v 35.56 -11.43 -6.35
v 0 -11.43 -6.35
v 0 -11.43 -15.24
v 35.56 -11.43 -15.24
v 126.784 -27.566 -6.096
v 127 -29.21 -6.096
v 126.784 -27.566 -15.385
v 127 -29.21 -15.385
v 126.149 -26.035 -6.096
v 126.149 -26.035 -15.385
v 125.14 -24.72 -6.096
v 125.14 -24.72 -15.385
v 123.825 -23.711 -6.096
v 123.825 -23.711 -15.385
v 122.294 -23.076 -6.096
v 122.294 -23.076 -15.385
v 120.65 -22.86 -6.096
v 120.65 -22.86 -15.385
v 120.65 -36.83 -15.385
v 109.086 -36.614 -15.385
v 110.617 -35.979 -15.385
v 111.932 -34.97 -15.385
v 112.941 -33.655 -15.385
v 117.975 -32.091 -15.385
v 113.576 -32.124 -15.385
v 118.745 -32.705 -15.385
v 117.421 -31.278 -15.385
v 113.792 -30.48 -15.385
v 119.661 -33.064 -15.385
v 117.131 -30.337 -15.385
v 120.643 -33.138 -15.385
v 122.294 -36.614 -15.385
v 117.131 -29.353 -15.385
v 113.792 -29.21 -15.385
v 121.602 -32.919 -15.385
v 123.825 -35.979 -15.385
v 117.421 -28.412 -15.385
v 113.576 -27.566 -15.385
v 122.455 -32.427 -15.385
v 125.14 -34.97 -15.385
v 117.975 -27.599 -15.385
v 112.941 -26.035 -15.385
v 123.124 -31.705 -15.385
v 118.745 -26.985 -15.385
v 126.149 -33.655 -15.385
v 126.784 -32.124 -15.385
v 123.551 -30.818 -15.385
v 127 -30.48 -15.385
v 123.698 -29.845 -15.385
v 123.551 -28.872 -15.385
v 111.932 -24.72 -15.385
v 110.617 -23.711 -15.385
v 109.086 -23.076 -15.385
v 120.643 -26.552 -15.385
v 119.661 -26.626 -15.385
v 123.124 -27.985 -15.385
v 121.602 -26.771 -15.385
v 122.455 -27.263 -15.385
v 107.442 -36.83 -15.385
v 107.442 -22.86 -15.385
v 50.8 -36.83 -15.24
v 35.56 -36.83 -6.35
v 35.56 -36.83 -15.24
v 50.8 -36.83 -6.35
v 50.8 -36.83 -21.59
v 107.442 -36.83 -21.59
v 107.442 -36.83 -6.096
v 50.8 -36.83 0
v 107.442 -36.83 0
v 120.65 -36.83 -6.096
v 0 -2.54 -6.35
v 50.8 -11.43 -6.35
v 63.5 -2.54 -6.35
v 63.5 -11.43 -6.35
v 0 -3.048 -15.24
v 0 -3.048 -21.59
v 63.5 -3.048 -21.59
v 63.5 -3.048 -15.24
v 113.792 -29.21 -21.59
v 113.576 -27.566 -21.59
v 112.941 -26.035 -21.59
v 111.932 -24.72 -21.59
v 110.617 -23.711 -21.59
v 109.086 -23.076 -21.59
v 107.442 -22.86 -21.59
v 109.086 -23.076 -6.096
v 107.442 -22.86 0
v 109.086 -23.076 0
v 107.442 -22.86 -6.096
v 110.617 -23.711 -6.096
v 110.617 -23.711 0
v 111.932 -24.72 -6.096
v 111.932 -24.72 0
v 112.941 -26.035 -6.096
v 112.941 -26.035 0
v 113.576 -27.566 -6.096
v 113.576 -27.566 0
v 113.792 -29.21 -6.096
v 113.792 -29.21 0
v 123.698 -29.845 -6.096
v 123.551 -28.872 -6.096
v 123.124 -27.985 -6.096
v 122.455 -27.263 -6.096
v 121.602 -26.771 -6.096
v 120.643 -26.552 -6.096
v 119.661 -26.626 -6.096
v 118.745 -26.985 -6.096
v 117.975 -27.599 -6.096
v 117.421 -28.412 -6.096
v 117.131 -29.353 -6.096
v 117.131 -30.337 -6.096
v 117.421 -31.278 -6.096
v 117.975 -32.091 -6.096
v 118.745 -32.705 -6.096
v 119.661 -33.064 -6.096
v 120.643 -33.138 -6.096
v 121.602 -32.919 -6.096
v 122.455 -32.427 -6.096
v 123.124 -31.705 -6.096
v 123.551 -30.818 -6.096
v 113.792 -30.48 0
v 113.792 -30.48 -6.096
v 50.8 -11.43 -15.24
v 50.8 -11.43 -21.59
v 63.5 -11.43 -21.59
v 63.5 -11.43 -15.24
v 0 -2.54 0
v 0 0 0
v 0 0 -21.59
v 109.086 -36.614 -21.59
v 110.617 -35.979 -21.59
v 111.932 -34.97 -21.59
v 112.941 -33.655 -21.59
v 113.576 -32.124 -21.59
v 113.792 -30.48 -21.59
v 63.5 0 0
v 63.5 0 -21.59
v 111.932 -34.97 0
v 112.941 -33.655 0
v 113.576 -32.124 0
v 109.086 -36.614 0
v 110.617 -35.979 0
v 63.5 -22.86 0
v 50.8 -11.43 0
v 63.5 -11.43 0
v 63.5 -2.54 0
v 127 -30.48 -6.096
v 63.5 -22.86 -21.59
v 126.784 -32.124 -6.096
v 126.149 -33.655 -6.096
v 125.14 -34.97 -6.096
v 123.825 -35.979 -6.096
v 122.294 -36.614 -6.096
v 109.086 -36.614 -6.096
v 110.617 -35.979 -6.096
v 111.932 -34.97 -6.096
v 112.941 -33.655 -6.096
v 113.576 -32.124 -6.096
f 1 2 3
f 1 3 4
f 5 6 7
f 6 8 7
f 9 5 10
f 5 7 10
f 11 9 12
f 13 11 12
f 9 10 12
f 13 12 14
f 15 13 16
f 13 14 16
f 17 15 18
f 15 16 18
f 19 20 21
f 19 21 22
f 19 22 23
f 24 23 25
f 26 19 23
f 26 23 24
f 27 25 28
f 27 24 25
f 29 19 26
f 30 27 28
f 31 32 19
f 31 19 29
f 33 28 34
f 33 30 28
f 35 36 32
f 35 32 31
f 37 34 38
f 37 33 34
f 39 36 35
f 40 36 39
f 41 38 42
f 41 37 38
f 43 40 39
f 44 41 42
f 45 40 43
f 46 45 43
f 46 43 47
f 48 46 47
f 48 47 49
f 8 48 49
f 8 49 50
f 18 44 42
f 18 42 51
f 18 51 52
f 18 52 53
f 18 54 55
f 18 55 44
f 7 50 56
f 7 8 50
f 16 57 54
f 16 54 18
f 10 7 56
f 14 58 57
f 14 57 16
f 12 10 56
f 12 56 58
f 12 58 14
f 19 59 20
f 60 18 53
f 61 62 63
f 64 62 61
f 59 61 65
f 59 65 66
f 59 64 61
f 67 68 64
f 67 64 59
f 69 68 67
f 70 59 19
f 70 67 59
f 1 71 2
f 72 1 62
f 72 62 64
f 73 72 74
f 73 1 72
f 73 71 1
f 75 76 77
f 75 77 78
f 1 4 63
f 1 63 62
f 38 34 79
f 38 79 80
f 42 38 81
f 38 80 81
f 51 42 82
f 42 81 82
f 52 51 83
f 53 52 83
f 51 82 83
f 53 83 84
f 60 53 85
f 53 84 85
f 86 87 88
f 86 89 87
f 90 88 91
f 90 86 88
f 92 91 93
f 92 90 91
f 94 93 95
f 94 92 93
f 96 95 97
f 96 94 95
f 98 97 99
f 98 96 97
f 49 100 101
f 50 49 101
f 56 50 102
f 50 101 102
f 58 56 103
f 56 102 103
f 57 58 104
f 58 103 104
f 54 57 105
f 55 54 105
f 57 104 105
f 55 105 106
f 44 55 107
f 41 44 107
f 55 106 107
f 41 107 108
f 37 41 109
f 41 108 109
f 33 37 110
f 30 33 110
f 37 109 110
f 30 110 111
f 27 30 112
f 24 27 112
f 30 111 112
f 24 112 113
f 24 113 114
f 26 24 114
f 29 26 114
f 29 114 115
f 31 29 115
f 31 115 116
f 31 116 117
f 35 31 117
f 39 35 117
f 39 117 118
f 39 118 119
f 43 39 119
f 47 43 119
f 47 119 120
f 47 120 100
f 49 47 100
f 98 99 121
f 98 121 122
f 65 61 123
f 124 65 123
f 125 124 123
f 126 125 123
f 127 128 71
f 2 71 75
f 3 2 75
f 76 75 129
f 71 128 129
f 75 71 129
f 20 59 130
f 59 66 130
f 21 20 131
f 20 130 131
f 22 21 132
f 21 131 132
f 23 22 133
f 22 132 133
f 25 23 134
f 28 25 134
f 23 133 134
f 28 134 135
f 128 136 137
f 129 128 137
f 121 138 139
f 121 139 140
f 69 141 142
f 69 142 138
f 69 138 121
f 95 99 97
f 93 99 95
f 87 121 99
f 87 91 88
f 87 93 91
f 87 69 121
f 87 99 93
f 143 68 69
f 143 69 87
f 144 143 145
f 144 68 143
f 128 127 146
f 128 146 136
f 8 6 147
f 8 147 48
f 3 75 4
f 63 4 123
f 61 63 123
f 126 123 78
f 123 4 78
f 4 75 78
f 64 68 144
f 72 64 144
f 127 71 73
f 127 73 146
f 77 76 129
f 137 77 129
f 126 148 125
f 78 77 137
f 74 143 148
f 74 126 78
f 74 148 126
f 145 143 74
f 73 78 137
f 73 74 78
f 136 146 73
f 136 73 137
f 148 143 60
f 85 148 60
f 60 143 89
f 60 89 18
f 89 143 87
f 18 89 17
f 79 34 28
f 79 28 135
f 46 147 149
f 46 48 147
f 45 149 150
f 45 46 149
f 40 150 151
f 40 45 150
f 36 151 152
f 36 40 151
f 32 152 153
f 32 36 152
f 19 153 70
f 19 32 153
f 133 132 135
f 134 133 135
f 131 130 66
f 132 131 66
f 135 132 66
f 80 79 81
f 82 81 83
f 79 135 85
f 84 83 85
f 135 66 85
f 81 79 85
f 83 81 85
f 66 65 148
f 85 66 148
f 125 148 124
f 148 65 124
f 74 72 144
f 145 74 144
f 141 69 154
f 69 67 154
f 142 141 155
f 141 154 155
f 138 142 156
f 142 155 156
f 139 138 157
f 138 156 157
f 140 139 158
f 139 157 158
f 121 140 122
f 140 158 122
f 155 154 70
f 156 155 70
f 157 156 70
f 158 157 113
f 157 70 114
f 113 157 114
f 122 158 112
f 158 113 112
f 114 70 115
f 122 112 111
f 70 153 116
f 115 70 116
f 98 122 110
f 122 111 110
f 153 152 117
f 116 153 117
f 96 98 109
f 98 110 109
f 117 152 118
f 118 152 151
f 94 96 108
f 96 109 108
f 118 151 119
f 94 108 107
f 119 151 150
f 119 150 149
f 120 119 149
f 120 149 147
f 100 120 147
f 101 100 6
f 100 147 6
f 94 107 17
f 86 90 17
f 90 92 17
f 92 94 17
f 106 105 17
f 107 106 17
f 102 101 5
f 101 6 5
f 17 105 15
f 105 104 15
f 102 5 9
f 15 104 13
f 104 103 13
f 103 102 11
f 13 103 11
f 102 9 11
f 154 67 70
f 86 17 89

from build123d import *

# Parameters (mm, degrees)
SKETCH1_W           = 21.59
SKETCH1_H           = 36.83
BOSS_EXTRUDE1_DEPTH = 127
SKETCH2_W           = 50.8
SKETCH2_H           = 25.4
CUT_EXTRUDE1_DEPTH  = 25.4
SKETCH3_W           = 63.5
SKETCH3_H           = 22.86
CUT_EXTRUDE2_DEPTH  = 22.86
SKETCH4_W           = 6.35
SKETCH4_H           = 8.382
CUT_EXTRUDE3_DEPTH  = 69.85
SKETCH5_W           = 6.35
SKETCH5_H           = 8.89
CUT_EXTRUDE4_DEPTH  = 69.85
SKETCH6_W           = 6.096
SKETCH6_H           = 13.97
CUT_EXTRUDE5_DEPTH  = 13.208
SKETCH7_W           = 6.205413724
SKETCH7_H           = 13.97
CUT_EXTRUDE6_DEPTH  = 13.208
SKETCH8_R           = 3.302
CUT_EXTRUDE7_DEPTH  = 13.208
FILLET1_R           = 6.35
FILLET2_R           = 6.35
FILLET3_R           = 6.35
FILLET4_R           = 6.35
FILLET5_R           = 6.35
FILLET6_R           = 6.35
SKETCH9_W           = 15.24
SKETCH9_H           = 8.89
BOSS_EXTRUDE2_DEPTH = 25.4


with BuildPart() as part:
    # Sketch1 → Boss-Extrude1 (new body)
    with BuildSketch(Plane(origin=(0, 0, 0), x_dir=(0, 0, -1), z_dir=(1, 0, 0))):
        with Locations((10.795, -18.415)):
            Rectangle(SKETCH1_W, SKETCH1_H)
    extrude(amount=BOSS_EXTRUDE1_DEPTH)

    # Sketch2 → Cut-Extrude1 (cut)
    with BuildSketch(Plane.XY):
        with Locations((25.4, -24.13)):
            Rectangle(SKETCH2_W, SKETCH2_H)
    extrude(amount=-CUT_EXTRUDE1_DEPTH, mode=Mode.SUBTRACT)

    # Sketch3 → Cut-Extrude2 (cut)
    with BuildSketch(Plane.XY):
        with Locations((95.25, -11.43)):
            Rectangle(SKETCH3_W, SKETCH3_H)
    extrude(amount=-CUT_EXTRUDE2_DEPTH, mode=Mode.SUBTRACT)

    # Sketch4 → Cut-Extrude3 (cut)
    with BuildSketch(Plane.ZY):
        with Locations((-18.415, -7.239)):
            Rectangle(SKETCH4_W, SKETCH4_H)
    extrude(amount=-CUT_EXTRUDE3_DEPTH, mode=Mode.SUBTRACT)

    # Sketch5 → Cut-Extrude4 (cut)
    with BuildSketch(Plane.ZY):
        with Locations((-3.175, -6.985)):
            Rectangle(SKETCH5_W, SKETCH5_H)
    extrude(amount=-CUT_EXTRUDE4_DEPTH, mode=Mode.SUBTRACT)

    # Sketch6 → Cut-Extrude5 (cut)
    with BuildSketch(Plane(origin=(127, 0, 0), x_dir=(0, 0, -1), z_dir=(1, 0, 0))):
        with Locations((3.048, -29.845)):
            Rectangle(SKETCH6_W, SKETCH6_H)
    extrude(amount=-CUT_EXTRUDE5_DEPTH, mode=Mode.SUBTRACT)

    # Sketch7 → Cut-Extrude6 (cut)
    with BuildSketch(Plane(origin=(127, 0, 0), x_dir=(0, 0, -1), z_dir=(1, 0, 0))):
        with Locations((18.487293138, -29.845)):
            Rectangle(SKETCH7_W, SKETCH7_H)
    extrude(amount=-CUT_EXTRUDE6_DEPTH, mode=Mode.SUBTRACT)

    # Sketch8 → Cut-Extrude7 (cut)
    with BuildSketch(Plane.XY.offset(-6.096)):
        with Locations((120.396, -29.845)):
            Circle(SKETCH8_R)
    extrude(amount=-CUT_EXTRUDE7_DEPTH, mode=Mode.SUBTRACT)

    # Fillet1
    fillet1_edges = [part.edges().sort_by_distance(p)[0] for p in [
        (113.792, -22.86, -3.048),
    ]]
    fillet(fillet1_edges, radius=FILLET1_R)

    # Fillet2
    fillet2_edges = [part.edges().sort_by_distance(p)[0] for p in [
        (113.792, -36.83, -3.048),
    ]]
    fillet(fillet2_edges, radius=FILLET2_R)

    # Fillet3
    fillet3_edges = [part.edges().sort_by_distance(p)[0] for p in [
        (113.792, -22.86, -18.487293138),
    ]]
    fillet(fillet3_edges, radius=FILLET3_R)

    # Fillet4
    fillet4_edges = [part.edges().sort_by_distance(p)[0] for p in [
        (113.792, -36.83, -18.487293138),
    ]]
    fillet(fillet4_edges, radius=FILLET4_R)

    # Fillet5
    fillet5_edges = [part.edges().sort_by_distance(p)[0] for p in [
        (127, -22.86, -10.740293138),
    ]]
    fillet(fillet5_edges, radius=FILLET5_R)

    # Fillet6
    fillet6_edges = [part.edges().sort_by_distance(p)[0] for p in [
        (127, -36.83, -10.740293138),
    ]]
    fillet(fillet6_edges, radius=FILLET6_R)

    # Sketch9 → Boss-Extrude2 (add)
    with BuildSketch(Plane.XZ.offset(11.43)):
        with Locations((43.18, -10.795)):
            Rectangle(SKETCH9_W, SKETCH9_H)
    extrude(amount=BOSS_EXTRUDE2_DEPTH)


solid = part.part
